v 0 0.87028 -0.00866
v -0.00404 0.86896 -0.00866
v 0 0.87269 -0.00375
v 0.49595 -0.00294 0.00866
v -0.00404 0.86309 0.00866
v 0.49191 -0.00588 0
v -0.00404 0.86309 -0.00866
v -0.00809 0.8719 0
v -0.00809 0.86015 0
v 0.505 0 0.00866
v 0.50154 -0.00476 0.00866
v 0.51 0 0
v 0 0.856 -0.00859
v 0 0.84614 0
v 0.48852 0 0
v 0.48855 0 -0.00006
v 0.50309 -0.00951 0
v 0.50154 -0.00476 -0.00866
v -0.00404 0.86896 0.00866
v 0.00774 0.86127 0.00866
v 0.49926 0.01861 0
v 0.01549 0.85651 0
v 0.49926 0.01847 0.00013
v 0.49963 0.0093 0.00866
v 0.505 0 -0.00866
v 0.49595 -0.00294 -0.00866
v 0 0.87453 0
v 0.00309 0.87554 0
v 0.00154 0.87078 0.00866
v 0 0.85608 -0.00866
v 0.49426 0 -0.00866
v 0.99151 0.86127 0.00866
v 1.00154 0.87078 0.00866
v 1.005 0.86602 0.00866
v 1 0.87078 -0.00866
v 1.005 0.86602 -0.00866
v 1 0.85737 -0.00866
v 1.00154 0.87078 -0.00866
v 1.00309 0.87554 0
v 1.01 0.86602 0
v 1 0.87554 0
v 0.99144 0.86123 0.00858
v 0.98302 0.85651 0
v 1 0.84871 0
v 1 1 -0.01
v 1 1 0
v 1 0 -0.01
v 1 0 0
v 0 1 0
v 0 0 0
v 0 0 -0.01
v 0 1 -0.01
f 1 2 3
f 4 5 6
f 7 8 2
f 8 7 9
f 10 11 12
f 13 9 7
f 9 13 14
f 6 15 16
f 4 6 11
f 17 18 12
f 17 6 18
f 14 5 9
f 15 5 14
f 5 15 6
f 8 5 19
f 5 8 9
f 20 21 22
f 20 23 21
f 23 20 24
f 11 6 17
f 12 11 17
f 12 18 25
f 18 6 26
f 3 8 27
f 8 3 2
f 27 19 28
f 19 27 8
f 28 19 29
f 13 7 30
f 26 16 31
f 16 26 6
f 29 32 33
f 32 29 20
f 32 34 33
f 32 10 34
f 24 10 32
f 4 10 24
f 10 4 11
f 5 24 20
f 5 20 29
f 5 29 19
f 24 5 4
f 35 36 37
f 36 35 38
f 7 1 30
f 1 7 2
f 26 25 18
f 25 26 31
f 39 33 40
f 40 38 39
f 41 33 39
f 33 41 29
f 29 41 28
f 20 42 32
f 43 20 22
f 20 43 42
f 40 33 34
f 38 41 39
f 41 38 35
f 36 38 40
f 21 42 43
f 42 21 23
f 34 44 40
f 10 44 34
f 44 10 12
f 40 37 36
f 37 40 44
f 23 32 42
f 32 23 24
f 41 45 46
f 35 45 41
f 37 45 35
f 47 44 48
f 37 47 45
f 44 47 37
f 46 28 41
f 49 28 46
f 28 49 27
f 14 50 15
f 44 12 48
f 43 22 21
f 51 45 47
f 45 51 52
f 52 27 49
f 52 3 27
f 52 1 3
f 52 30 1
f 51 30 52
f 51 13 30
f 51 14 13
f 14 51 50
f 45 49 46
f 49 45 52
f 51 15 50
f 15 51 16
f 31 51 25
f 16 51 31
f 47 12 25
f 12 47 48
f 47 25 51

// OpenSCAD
hull(){
    translate([0.5, 0.0]) sphere(0.01);
    translate([0.0, 0.8660254037844386]) sphere(0.01);
}
hull(){
    translate([0.0, 0.8660254037844386]) sphere(0.01);
    translate([1.0, 0.8660254037844386]) sphere(0.01);
}
hull(){
    translate([1.0, 0.8660254037844386]) sphere(0.01);
    translate([0.5, 0.0]) sphere(0.01);
}
translate([0,0,-0.01]) color([0.1,0.1,0.1]) cube([1,1,0.01]);
